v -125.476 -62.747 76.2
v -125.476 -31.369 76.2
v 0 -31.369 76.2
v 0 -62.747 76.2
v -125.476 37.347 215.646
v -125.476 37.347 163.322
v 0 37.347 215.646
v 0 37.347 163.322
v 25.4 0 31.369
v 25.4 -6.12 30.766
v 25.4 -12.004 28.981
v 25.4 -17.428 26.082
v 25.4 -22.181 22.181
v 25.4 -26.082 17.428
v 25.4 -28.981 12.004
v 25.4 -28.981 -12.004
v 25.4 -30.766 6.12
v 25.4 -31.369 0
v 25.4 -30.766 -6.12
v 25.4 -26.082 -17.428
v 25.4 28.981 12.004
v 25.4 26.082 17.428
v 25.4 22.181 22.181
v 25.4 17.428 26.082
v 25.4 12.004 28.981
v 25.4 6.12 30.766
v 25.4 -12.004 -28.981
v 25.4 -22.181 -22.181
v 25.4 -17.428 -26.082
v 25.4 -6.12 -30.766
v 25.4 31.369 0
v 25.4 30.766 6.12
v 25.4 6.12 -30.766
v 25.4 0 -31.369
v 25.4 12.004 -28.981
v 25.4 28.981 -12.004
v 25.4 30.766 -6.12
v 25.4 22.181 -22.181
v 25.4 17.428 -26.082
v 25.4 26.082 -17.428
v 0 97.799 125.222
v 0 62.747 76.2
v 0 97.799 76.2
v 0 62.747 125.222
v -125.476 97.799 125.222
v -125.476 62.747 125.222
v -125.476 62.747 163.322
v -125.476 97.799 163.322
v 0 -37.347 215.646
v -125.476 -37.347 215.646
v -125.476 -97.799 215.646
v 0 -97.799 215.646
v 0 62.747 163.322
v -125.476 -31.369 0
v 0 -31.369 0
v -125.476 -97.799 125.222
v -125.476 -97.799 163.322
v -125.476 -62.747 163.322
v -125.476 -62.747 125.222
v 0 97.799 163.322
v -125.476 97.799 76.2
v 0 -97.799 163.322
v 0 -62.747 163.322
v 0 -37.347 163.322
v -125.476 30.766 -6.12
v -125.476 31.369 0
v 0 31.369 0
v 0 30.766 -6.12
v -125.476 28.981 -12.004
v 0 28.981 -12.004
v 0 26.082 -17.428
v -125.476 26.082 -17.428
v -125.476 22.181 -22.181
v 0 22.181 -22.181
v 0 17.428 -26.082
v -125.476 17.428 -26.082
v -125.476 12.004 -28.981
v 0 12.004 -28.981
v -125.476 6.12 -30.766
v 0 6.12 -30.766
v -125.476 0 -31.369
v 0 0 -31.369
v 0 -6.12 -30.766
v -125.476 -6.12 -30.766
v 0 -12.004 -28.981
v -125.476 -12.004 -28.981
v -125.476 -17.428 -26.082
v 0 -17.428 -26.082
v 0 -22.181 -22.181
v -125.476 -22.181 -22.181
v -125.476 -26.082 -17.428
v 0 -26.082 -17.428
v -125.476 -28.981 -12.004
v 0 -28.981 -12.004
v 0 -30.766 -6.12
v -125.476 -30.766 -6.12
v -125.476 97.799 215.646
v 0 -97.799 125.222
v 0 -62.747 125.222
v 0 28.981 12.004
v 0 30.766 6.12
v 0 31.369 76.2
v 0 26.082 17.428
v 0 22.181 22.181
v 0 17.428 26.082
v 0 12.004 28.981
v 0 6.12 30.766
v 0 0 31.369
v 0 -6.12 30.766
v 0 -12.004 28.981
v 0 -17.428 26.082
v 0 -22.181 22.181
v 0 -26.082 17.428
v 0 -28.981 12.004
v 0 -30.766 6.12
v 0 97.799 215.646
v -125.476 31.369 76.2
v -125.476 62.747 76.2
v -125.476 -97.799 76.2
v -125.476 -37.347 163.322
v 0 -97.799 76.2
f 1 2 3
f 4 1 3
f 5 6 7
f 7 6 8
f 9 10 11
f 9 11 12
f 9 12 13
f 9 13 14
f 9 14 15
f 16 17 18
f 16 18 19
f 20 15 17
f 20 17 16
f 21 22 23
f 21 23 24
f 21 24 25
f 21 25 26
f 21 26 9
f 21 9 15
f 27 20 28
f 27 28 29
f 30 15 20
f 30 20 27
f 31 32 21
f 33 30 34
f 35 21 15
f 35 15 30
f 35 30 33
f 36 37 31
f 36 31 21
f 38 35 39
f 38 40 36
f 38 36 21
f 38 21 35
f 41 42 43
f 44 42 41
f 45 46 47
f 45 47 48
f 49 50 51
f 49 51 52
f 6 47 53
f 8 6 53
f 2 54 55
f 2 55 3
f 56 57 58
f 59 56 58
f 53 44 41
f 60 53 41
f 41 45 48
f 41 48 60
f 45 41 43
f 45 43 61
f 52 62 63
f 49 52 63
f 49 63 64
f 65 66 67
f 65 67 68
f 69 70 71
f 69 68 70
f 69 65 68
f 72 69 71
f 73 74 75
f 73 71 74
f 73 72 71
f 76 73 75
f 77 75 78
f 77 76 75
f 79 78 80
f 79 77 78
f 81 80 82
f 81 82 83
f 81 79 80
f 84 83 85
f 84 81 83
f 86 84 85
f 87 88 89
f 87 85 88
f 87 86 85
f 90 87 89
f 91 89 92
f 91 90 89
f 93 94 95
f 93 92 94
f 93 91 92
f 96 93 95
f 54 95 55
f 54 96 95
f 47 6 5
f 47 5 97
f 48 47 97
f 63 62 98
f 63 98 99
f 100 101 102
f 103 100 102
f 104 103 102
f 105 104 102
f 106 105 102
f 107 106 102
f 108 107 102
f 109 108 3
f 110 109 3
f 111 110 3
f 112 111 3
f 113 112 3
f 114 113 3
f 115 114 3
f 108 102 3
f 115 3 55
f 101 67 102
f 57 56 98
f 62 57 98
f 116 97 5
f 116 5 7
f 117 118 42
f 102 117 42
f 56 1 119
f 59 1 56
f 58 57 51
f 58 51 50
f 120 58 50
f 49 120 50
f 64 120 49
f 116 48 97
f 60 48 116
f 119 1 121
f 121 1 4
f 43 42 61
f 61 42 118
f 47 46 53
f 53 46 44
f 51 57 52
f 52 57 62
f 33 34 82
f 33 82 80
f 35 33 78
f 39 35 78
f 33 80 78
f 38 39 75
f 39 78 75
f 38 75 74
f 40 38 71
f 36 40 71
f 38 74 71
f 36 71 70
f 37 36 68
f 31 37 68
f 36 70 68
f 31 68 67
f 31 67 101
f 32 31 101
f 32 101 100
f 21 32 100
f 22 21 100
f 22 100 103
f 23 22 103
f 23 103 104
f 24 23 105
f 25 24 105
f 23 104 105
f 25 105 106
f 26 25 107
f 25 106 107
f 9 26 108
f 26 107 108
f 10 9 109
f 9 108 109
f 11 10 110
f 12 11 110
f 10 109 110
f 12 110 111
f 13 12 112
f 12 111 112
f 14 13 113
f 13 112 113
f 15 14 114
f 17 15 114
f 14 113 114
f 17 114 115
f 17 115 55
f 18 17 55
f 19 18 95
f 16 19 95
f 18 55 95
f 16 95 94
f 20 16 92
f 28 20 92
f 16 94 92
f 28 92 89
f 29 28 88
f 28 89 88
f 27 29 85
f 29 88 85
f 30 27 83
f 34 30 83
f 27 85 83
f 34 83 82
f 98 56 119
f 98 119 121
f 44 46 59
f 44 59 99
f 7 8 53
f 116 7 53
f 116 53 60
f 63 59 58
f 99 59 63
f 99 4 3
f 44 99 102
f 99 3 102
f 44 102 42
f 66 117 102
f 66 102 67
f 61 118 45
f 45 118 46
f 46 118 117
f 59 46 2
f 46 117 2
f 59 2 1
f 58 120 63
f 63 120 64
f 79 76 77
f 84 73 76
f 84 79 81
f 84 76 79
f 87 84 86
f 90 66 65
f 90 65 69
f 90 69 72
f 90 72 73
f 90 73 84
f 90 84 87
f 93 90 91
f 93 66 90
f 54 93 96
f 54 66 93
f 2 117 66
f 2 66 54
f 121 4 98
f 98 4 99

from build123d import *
from build123d.topology import SkipClean

# Parameters (mm, degrees)
SKETCH2_R           = 31.369
BOSS_EXTRUDE1_DEPTH = 25.4
BOSS_EXTRUDE2_START = 125.476
BOSS_EXTRUDE2_DEPTH = 125.476
BOSS_EXTRUDE3_DEPTH = 49.022
SKETCH8_W           = 125.476
SKETCH8_H           = 49.022
BOSS_EXTRUDE4_DEPTH = 35.052
SKETCH9_W           = 125.476
SKETCH9_H           = 49.022
BOSS_EXTRUDE5_DEPTH = 35.052
SKETCH10_W          = 125.476
SKETCH10_H          = 35.052
BOSS_EXTRUDE6_DEPTH = 38.1
SKETCH12_W          = 125.476
SKETCH12_H          = 60.452
BOSS_EXTRUDE7_DEPTH = 52.324


with BuildPart() as part:
    # Sketch2 → Boss-Extrude1 (new body)
    with BuildSketch(Plane.YZ):
        with Locations(Location((0, 0, 0), (0, 0, 270))):
            Circle(SKETCH2_R)
    extrude(amount=BOSS_EXTRUDE1_DEPTH)

    # Sketch4 → Boss-Extrude2 (add)
    with SkipClean():  # the faces are left unmerged after this step: merging them gives an invalid solid
        with BuildSketch(Plane(origin=(0, 0, 0), x_dir=(0, -1, 0), z_dir=(-1, 0, 0)).offset(BOSS_EXTRUDE2_START)):
            with BuildLine():
                Line((31.369, 0), (31.369, 76.2))
                Line((31.369, 76.2), (-31.369, 76.2))
                Line((-31.369, 76.2), (-31.369, 0))
                ThreePointArc((-31.369, 0), (0, -31.369), (31.369, 0))
            make_face()
        extrude(amount=-BOSS_EXTRUDE2_DEPTH)

    # Sketch5 → Boss-Extrude3 (add)
    with SkipClean():  # the faces are left unmerged after this step: merging them gives an invalid solid
        with BuildSketch(Plane.XY.offset(76.2)):
            Polygon((0, 0), (0, 62.747251031), (-125.476, 62.747251031), (-125.476, -62.747251031), (0, -62.747251031), align=None)
        extrude(amount=BOSS_EXTRUDE3_DEPTH)

    # Sketch8 → Boss-Extrude4 (add)
    with SkipClean():  # the faces are left unmerged after this step: merging them gives an invalid solid
        with BuildSketch(Plane(origin=(0, 62.747251031, 0), x_dir=(-1, 0, 0), z_dir=(0, 1, 0))):
            with Locations((62.738, 100.711)):
                Rectangle(SKETCH8_W, SKETCH8_H)
        extrude(amount=BOSS_EXTRUDE4_DEPTH)

    # Sketch9 → Boss-Extrude5 (add)
    with SkipClean():  # the faces are left unmerged after this step: merging them gives an invalid solid
        with BuildSketch(Plane.XZ.offset(62.747251031)):
            with Locations((-62.738, 100.711)):
                Rectangle(SKETCH9_W, SKETCH9_H)
        extrude(amount=BOSS_EXTRUDE5_DEPTH)

    # Sketch10 → Boss-Extrude6 (add)
    with SkipClean():  # the faces are left unmerged after this step: merging them gives an invalid solid
        with BuildSketch(Plane.XY.offset(125.222)):
            with Locations((-62.738, 80.273251031)):
                Rectangle(SKETCH10_W, SKETCH10_H)
            with Locations((-62.738, -80.273251031)):
                Rectangle(SKETCH10_W, SKETCH10_H)
        extrude(amount=BOSS_EXTRUDE6_DEPTH)

    # Sketch12 → Boss-Extrude7 (add)
    with SkipClean():  # the faces are left unmerged after this step: merging them gives an invalid solid
        with BuildSketch(Plane.XY.offset(163.322)):
            with Locations((-62.738, 67.573251031)):
                Rectangle(SKETCH12_W, SKETCH12_H)
            with Locations((-62.738, -67.573251031)):
                Rectangle(SKETCH12_W, SKETCH12_H)
        extrude(amount=BOSS_EXTRUDE7_DEPTH)


solid = part.part
